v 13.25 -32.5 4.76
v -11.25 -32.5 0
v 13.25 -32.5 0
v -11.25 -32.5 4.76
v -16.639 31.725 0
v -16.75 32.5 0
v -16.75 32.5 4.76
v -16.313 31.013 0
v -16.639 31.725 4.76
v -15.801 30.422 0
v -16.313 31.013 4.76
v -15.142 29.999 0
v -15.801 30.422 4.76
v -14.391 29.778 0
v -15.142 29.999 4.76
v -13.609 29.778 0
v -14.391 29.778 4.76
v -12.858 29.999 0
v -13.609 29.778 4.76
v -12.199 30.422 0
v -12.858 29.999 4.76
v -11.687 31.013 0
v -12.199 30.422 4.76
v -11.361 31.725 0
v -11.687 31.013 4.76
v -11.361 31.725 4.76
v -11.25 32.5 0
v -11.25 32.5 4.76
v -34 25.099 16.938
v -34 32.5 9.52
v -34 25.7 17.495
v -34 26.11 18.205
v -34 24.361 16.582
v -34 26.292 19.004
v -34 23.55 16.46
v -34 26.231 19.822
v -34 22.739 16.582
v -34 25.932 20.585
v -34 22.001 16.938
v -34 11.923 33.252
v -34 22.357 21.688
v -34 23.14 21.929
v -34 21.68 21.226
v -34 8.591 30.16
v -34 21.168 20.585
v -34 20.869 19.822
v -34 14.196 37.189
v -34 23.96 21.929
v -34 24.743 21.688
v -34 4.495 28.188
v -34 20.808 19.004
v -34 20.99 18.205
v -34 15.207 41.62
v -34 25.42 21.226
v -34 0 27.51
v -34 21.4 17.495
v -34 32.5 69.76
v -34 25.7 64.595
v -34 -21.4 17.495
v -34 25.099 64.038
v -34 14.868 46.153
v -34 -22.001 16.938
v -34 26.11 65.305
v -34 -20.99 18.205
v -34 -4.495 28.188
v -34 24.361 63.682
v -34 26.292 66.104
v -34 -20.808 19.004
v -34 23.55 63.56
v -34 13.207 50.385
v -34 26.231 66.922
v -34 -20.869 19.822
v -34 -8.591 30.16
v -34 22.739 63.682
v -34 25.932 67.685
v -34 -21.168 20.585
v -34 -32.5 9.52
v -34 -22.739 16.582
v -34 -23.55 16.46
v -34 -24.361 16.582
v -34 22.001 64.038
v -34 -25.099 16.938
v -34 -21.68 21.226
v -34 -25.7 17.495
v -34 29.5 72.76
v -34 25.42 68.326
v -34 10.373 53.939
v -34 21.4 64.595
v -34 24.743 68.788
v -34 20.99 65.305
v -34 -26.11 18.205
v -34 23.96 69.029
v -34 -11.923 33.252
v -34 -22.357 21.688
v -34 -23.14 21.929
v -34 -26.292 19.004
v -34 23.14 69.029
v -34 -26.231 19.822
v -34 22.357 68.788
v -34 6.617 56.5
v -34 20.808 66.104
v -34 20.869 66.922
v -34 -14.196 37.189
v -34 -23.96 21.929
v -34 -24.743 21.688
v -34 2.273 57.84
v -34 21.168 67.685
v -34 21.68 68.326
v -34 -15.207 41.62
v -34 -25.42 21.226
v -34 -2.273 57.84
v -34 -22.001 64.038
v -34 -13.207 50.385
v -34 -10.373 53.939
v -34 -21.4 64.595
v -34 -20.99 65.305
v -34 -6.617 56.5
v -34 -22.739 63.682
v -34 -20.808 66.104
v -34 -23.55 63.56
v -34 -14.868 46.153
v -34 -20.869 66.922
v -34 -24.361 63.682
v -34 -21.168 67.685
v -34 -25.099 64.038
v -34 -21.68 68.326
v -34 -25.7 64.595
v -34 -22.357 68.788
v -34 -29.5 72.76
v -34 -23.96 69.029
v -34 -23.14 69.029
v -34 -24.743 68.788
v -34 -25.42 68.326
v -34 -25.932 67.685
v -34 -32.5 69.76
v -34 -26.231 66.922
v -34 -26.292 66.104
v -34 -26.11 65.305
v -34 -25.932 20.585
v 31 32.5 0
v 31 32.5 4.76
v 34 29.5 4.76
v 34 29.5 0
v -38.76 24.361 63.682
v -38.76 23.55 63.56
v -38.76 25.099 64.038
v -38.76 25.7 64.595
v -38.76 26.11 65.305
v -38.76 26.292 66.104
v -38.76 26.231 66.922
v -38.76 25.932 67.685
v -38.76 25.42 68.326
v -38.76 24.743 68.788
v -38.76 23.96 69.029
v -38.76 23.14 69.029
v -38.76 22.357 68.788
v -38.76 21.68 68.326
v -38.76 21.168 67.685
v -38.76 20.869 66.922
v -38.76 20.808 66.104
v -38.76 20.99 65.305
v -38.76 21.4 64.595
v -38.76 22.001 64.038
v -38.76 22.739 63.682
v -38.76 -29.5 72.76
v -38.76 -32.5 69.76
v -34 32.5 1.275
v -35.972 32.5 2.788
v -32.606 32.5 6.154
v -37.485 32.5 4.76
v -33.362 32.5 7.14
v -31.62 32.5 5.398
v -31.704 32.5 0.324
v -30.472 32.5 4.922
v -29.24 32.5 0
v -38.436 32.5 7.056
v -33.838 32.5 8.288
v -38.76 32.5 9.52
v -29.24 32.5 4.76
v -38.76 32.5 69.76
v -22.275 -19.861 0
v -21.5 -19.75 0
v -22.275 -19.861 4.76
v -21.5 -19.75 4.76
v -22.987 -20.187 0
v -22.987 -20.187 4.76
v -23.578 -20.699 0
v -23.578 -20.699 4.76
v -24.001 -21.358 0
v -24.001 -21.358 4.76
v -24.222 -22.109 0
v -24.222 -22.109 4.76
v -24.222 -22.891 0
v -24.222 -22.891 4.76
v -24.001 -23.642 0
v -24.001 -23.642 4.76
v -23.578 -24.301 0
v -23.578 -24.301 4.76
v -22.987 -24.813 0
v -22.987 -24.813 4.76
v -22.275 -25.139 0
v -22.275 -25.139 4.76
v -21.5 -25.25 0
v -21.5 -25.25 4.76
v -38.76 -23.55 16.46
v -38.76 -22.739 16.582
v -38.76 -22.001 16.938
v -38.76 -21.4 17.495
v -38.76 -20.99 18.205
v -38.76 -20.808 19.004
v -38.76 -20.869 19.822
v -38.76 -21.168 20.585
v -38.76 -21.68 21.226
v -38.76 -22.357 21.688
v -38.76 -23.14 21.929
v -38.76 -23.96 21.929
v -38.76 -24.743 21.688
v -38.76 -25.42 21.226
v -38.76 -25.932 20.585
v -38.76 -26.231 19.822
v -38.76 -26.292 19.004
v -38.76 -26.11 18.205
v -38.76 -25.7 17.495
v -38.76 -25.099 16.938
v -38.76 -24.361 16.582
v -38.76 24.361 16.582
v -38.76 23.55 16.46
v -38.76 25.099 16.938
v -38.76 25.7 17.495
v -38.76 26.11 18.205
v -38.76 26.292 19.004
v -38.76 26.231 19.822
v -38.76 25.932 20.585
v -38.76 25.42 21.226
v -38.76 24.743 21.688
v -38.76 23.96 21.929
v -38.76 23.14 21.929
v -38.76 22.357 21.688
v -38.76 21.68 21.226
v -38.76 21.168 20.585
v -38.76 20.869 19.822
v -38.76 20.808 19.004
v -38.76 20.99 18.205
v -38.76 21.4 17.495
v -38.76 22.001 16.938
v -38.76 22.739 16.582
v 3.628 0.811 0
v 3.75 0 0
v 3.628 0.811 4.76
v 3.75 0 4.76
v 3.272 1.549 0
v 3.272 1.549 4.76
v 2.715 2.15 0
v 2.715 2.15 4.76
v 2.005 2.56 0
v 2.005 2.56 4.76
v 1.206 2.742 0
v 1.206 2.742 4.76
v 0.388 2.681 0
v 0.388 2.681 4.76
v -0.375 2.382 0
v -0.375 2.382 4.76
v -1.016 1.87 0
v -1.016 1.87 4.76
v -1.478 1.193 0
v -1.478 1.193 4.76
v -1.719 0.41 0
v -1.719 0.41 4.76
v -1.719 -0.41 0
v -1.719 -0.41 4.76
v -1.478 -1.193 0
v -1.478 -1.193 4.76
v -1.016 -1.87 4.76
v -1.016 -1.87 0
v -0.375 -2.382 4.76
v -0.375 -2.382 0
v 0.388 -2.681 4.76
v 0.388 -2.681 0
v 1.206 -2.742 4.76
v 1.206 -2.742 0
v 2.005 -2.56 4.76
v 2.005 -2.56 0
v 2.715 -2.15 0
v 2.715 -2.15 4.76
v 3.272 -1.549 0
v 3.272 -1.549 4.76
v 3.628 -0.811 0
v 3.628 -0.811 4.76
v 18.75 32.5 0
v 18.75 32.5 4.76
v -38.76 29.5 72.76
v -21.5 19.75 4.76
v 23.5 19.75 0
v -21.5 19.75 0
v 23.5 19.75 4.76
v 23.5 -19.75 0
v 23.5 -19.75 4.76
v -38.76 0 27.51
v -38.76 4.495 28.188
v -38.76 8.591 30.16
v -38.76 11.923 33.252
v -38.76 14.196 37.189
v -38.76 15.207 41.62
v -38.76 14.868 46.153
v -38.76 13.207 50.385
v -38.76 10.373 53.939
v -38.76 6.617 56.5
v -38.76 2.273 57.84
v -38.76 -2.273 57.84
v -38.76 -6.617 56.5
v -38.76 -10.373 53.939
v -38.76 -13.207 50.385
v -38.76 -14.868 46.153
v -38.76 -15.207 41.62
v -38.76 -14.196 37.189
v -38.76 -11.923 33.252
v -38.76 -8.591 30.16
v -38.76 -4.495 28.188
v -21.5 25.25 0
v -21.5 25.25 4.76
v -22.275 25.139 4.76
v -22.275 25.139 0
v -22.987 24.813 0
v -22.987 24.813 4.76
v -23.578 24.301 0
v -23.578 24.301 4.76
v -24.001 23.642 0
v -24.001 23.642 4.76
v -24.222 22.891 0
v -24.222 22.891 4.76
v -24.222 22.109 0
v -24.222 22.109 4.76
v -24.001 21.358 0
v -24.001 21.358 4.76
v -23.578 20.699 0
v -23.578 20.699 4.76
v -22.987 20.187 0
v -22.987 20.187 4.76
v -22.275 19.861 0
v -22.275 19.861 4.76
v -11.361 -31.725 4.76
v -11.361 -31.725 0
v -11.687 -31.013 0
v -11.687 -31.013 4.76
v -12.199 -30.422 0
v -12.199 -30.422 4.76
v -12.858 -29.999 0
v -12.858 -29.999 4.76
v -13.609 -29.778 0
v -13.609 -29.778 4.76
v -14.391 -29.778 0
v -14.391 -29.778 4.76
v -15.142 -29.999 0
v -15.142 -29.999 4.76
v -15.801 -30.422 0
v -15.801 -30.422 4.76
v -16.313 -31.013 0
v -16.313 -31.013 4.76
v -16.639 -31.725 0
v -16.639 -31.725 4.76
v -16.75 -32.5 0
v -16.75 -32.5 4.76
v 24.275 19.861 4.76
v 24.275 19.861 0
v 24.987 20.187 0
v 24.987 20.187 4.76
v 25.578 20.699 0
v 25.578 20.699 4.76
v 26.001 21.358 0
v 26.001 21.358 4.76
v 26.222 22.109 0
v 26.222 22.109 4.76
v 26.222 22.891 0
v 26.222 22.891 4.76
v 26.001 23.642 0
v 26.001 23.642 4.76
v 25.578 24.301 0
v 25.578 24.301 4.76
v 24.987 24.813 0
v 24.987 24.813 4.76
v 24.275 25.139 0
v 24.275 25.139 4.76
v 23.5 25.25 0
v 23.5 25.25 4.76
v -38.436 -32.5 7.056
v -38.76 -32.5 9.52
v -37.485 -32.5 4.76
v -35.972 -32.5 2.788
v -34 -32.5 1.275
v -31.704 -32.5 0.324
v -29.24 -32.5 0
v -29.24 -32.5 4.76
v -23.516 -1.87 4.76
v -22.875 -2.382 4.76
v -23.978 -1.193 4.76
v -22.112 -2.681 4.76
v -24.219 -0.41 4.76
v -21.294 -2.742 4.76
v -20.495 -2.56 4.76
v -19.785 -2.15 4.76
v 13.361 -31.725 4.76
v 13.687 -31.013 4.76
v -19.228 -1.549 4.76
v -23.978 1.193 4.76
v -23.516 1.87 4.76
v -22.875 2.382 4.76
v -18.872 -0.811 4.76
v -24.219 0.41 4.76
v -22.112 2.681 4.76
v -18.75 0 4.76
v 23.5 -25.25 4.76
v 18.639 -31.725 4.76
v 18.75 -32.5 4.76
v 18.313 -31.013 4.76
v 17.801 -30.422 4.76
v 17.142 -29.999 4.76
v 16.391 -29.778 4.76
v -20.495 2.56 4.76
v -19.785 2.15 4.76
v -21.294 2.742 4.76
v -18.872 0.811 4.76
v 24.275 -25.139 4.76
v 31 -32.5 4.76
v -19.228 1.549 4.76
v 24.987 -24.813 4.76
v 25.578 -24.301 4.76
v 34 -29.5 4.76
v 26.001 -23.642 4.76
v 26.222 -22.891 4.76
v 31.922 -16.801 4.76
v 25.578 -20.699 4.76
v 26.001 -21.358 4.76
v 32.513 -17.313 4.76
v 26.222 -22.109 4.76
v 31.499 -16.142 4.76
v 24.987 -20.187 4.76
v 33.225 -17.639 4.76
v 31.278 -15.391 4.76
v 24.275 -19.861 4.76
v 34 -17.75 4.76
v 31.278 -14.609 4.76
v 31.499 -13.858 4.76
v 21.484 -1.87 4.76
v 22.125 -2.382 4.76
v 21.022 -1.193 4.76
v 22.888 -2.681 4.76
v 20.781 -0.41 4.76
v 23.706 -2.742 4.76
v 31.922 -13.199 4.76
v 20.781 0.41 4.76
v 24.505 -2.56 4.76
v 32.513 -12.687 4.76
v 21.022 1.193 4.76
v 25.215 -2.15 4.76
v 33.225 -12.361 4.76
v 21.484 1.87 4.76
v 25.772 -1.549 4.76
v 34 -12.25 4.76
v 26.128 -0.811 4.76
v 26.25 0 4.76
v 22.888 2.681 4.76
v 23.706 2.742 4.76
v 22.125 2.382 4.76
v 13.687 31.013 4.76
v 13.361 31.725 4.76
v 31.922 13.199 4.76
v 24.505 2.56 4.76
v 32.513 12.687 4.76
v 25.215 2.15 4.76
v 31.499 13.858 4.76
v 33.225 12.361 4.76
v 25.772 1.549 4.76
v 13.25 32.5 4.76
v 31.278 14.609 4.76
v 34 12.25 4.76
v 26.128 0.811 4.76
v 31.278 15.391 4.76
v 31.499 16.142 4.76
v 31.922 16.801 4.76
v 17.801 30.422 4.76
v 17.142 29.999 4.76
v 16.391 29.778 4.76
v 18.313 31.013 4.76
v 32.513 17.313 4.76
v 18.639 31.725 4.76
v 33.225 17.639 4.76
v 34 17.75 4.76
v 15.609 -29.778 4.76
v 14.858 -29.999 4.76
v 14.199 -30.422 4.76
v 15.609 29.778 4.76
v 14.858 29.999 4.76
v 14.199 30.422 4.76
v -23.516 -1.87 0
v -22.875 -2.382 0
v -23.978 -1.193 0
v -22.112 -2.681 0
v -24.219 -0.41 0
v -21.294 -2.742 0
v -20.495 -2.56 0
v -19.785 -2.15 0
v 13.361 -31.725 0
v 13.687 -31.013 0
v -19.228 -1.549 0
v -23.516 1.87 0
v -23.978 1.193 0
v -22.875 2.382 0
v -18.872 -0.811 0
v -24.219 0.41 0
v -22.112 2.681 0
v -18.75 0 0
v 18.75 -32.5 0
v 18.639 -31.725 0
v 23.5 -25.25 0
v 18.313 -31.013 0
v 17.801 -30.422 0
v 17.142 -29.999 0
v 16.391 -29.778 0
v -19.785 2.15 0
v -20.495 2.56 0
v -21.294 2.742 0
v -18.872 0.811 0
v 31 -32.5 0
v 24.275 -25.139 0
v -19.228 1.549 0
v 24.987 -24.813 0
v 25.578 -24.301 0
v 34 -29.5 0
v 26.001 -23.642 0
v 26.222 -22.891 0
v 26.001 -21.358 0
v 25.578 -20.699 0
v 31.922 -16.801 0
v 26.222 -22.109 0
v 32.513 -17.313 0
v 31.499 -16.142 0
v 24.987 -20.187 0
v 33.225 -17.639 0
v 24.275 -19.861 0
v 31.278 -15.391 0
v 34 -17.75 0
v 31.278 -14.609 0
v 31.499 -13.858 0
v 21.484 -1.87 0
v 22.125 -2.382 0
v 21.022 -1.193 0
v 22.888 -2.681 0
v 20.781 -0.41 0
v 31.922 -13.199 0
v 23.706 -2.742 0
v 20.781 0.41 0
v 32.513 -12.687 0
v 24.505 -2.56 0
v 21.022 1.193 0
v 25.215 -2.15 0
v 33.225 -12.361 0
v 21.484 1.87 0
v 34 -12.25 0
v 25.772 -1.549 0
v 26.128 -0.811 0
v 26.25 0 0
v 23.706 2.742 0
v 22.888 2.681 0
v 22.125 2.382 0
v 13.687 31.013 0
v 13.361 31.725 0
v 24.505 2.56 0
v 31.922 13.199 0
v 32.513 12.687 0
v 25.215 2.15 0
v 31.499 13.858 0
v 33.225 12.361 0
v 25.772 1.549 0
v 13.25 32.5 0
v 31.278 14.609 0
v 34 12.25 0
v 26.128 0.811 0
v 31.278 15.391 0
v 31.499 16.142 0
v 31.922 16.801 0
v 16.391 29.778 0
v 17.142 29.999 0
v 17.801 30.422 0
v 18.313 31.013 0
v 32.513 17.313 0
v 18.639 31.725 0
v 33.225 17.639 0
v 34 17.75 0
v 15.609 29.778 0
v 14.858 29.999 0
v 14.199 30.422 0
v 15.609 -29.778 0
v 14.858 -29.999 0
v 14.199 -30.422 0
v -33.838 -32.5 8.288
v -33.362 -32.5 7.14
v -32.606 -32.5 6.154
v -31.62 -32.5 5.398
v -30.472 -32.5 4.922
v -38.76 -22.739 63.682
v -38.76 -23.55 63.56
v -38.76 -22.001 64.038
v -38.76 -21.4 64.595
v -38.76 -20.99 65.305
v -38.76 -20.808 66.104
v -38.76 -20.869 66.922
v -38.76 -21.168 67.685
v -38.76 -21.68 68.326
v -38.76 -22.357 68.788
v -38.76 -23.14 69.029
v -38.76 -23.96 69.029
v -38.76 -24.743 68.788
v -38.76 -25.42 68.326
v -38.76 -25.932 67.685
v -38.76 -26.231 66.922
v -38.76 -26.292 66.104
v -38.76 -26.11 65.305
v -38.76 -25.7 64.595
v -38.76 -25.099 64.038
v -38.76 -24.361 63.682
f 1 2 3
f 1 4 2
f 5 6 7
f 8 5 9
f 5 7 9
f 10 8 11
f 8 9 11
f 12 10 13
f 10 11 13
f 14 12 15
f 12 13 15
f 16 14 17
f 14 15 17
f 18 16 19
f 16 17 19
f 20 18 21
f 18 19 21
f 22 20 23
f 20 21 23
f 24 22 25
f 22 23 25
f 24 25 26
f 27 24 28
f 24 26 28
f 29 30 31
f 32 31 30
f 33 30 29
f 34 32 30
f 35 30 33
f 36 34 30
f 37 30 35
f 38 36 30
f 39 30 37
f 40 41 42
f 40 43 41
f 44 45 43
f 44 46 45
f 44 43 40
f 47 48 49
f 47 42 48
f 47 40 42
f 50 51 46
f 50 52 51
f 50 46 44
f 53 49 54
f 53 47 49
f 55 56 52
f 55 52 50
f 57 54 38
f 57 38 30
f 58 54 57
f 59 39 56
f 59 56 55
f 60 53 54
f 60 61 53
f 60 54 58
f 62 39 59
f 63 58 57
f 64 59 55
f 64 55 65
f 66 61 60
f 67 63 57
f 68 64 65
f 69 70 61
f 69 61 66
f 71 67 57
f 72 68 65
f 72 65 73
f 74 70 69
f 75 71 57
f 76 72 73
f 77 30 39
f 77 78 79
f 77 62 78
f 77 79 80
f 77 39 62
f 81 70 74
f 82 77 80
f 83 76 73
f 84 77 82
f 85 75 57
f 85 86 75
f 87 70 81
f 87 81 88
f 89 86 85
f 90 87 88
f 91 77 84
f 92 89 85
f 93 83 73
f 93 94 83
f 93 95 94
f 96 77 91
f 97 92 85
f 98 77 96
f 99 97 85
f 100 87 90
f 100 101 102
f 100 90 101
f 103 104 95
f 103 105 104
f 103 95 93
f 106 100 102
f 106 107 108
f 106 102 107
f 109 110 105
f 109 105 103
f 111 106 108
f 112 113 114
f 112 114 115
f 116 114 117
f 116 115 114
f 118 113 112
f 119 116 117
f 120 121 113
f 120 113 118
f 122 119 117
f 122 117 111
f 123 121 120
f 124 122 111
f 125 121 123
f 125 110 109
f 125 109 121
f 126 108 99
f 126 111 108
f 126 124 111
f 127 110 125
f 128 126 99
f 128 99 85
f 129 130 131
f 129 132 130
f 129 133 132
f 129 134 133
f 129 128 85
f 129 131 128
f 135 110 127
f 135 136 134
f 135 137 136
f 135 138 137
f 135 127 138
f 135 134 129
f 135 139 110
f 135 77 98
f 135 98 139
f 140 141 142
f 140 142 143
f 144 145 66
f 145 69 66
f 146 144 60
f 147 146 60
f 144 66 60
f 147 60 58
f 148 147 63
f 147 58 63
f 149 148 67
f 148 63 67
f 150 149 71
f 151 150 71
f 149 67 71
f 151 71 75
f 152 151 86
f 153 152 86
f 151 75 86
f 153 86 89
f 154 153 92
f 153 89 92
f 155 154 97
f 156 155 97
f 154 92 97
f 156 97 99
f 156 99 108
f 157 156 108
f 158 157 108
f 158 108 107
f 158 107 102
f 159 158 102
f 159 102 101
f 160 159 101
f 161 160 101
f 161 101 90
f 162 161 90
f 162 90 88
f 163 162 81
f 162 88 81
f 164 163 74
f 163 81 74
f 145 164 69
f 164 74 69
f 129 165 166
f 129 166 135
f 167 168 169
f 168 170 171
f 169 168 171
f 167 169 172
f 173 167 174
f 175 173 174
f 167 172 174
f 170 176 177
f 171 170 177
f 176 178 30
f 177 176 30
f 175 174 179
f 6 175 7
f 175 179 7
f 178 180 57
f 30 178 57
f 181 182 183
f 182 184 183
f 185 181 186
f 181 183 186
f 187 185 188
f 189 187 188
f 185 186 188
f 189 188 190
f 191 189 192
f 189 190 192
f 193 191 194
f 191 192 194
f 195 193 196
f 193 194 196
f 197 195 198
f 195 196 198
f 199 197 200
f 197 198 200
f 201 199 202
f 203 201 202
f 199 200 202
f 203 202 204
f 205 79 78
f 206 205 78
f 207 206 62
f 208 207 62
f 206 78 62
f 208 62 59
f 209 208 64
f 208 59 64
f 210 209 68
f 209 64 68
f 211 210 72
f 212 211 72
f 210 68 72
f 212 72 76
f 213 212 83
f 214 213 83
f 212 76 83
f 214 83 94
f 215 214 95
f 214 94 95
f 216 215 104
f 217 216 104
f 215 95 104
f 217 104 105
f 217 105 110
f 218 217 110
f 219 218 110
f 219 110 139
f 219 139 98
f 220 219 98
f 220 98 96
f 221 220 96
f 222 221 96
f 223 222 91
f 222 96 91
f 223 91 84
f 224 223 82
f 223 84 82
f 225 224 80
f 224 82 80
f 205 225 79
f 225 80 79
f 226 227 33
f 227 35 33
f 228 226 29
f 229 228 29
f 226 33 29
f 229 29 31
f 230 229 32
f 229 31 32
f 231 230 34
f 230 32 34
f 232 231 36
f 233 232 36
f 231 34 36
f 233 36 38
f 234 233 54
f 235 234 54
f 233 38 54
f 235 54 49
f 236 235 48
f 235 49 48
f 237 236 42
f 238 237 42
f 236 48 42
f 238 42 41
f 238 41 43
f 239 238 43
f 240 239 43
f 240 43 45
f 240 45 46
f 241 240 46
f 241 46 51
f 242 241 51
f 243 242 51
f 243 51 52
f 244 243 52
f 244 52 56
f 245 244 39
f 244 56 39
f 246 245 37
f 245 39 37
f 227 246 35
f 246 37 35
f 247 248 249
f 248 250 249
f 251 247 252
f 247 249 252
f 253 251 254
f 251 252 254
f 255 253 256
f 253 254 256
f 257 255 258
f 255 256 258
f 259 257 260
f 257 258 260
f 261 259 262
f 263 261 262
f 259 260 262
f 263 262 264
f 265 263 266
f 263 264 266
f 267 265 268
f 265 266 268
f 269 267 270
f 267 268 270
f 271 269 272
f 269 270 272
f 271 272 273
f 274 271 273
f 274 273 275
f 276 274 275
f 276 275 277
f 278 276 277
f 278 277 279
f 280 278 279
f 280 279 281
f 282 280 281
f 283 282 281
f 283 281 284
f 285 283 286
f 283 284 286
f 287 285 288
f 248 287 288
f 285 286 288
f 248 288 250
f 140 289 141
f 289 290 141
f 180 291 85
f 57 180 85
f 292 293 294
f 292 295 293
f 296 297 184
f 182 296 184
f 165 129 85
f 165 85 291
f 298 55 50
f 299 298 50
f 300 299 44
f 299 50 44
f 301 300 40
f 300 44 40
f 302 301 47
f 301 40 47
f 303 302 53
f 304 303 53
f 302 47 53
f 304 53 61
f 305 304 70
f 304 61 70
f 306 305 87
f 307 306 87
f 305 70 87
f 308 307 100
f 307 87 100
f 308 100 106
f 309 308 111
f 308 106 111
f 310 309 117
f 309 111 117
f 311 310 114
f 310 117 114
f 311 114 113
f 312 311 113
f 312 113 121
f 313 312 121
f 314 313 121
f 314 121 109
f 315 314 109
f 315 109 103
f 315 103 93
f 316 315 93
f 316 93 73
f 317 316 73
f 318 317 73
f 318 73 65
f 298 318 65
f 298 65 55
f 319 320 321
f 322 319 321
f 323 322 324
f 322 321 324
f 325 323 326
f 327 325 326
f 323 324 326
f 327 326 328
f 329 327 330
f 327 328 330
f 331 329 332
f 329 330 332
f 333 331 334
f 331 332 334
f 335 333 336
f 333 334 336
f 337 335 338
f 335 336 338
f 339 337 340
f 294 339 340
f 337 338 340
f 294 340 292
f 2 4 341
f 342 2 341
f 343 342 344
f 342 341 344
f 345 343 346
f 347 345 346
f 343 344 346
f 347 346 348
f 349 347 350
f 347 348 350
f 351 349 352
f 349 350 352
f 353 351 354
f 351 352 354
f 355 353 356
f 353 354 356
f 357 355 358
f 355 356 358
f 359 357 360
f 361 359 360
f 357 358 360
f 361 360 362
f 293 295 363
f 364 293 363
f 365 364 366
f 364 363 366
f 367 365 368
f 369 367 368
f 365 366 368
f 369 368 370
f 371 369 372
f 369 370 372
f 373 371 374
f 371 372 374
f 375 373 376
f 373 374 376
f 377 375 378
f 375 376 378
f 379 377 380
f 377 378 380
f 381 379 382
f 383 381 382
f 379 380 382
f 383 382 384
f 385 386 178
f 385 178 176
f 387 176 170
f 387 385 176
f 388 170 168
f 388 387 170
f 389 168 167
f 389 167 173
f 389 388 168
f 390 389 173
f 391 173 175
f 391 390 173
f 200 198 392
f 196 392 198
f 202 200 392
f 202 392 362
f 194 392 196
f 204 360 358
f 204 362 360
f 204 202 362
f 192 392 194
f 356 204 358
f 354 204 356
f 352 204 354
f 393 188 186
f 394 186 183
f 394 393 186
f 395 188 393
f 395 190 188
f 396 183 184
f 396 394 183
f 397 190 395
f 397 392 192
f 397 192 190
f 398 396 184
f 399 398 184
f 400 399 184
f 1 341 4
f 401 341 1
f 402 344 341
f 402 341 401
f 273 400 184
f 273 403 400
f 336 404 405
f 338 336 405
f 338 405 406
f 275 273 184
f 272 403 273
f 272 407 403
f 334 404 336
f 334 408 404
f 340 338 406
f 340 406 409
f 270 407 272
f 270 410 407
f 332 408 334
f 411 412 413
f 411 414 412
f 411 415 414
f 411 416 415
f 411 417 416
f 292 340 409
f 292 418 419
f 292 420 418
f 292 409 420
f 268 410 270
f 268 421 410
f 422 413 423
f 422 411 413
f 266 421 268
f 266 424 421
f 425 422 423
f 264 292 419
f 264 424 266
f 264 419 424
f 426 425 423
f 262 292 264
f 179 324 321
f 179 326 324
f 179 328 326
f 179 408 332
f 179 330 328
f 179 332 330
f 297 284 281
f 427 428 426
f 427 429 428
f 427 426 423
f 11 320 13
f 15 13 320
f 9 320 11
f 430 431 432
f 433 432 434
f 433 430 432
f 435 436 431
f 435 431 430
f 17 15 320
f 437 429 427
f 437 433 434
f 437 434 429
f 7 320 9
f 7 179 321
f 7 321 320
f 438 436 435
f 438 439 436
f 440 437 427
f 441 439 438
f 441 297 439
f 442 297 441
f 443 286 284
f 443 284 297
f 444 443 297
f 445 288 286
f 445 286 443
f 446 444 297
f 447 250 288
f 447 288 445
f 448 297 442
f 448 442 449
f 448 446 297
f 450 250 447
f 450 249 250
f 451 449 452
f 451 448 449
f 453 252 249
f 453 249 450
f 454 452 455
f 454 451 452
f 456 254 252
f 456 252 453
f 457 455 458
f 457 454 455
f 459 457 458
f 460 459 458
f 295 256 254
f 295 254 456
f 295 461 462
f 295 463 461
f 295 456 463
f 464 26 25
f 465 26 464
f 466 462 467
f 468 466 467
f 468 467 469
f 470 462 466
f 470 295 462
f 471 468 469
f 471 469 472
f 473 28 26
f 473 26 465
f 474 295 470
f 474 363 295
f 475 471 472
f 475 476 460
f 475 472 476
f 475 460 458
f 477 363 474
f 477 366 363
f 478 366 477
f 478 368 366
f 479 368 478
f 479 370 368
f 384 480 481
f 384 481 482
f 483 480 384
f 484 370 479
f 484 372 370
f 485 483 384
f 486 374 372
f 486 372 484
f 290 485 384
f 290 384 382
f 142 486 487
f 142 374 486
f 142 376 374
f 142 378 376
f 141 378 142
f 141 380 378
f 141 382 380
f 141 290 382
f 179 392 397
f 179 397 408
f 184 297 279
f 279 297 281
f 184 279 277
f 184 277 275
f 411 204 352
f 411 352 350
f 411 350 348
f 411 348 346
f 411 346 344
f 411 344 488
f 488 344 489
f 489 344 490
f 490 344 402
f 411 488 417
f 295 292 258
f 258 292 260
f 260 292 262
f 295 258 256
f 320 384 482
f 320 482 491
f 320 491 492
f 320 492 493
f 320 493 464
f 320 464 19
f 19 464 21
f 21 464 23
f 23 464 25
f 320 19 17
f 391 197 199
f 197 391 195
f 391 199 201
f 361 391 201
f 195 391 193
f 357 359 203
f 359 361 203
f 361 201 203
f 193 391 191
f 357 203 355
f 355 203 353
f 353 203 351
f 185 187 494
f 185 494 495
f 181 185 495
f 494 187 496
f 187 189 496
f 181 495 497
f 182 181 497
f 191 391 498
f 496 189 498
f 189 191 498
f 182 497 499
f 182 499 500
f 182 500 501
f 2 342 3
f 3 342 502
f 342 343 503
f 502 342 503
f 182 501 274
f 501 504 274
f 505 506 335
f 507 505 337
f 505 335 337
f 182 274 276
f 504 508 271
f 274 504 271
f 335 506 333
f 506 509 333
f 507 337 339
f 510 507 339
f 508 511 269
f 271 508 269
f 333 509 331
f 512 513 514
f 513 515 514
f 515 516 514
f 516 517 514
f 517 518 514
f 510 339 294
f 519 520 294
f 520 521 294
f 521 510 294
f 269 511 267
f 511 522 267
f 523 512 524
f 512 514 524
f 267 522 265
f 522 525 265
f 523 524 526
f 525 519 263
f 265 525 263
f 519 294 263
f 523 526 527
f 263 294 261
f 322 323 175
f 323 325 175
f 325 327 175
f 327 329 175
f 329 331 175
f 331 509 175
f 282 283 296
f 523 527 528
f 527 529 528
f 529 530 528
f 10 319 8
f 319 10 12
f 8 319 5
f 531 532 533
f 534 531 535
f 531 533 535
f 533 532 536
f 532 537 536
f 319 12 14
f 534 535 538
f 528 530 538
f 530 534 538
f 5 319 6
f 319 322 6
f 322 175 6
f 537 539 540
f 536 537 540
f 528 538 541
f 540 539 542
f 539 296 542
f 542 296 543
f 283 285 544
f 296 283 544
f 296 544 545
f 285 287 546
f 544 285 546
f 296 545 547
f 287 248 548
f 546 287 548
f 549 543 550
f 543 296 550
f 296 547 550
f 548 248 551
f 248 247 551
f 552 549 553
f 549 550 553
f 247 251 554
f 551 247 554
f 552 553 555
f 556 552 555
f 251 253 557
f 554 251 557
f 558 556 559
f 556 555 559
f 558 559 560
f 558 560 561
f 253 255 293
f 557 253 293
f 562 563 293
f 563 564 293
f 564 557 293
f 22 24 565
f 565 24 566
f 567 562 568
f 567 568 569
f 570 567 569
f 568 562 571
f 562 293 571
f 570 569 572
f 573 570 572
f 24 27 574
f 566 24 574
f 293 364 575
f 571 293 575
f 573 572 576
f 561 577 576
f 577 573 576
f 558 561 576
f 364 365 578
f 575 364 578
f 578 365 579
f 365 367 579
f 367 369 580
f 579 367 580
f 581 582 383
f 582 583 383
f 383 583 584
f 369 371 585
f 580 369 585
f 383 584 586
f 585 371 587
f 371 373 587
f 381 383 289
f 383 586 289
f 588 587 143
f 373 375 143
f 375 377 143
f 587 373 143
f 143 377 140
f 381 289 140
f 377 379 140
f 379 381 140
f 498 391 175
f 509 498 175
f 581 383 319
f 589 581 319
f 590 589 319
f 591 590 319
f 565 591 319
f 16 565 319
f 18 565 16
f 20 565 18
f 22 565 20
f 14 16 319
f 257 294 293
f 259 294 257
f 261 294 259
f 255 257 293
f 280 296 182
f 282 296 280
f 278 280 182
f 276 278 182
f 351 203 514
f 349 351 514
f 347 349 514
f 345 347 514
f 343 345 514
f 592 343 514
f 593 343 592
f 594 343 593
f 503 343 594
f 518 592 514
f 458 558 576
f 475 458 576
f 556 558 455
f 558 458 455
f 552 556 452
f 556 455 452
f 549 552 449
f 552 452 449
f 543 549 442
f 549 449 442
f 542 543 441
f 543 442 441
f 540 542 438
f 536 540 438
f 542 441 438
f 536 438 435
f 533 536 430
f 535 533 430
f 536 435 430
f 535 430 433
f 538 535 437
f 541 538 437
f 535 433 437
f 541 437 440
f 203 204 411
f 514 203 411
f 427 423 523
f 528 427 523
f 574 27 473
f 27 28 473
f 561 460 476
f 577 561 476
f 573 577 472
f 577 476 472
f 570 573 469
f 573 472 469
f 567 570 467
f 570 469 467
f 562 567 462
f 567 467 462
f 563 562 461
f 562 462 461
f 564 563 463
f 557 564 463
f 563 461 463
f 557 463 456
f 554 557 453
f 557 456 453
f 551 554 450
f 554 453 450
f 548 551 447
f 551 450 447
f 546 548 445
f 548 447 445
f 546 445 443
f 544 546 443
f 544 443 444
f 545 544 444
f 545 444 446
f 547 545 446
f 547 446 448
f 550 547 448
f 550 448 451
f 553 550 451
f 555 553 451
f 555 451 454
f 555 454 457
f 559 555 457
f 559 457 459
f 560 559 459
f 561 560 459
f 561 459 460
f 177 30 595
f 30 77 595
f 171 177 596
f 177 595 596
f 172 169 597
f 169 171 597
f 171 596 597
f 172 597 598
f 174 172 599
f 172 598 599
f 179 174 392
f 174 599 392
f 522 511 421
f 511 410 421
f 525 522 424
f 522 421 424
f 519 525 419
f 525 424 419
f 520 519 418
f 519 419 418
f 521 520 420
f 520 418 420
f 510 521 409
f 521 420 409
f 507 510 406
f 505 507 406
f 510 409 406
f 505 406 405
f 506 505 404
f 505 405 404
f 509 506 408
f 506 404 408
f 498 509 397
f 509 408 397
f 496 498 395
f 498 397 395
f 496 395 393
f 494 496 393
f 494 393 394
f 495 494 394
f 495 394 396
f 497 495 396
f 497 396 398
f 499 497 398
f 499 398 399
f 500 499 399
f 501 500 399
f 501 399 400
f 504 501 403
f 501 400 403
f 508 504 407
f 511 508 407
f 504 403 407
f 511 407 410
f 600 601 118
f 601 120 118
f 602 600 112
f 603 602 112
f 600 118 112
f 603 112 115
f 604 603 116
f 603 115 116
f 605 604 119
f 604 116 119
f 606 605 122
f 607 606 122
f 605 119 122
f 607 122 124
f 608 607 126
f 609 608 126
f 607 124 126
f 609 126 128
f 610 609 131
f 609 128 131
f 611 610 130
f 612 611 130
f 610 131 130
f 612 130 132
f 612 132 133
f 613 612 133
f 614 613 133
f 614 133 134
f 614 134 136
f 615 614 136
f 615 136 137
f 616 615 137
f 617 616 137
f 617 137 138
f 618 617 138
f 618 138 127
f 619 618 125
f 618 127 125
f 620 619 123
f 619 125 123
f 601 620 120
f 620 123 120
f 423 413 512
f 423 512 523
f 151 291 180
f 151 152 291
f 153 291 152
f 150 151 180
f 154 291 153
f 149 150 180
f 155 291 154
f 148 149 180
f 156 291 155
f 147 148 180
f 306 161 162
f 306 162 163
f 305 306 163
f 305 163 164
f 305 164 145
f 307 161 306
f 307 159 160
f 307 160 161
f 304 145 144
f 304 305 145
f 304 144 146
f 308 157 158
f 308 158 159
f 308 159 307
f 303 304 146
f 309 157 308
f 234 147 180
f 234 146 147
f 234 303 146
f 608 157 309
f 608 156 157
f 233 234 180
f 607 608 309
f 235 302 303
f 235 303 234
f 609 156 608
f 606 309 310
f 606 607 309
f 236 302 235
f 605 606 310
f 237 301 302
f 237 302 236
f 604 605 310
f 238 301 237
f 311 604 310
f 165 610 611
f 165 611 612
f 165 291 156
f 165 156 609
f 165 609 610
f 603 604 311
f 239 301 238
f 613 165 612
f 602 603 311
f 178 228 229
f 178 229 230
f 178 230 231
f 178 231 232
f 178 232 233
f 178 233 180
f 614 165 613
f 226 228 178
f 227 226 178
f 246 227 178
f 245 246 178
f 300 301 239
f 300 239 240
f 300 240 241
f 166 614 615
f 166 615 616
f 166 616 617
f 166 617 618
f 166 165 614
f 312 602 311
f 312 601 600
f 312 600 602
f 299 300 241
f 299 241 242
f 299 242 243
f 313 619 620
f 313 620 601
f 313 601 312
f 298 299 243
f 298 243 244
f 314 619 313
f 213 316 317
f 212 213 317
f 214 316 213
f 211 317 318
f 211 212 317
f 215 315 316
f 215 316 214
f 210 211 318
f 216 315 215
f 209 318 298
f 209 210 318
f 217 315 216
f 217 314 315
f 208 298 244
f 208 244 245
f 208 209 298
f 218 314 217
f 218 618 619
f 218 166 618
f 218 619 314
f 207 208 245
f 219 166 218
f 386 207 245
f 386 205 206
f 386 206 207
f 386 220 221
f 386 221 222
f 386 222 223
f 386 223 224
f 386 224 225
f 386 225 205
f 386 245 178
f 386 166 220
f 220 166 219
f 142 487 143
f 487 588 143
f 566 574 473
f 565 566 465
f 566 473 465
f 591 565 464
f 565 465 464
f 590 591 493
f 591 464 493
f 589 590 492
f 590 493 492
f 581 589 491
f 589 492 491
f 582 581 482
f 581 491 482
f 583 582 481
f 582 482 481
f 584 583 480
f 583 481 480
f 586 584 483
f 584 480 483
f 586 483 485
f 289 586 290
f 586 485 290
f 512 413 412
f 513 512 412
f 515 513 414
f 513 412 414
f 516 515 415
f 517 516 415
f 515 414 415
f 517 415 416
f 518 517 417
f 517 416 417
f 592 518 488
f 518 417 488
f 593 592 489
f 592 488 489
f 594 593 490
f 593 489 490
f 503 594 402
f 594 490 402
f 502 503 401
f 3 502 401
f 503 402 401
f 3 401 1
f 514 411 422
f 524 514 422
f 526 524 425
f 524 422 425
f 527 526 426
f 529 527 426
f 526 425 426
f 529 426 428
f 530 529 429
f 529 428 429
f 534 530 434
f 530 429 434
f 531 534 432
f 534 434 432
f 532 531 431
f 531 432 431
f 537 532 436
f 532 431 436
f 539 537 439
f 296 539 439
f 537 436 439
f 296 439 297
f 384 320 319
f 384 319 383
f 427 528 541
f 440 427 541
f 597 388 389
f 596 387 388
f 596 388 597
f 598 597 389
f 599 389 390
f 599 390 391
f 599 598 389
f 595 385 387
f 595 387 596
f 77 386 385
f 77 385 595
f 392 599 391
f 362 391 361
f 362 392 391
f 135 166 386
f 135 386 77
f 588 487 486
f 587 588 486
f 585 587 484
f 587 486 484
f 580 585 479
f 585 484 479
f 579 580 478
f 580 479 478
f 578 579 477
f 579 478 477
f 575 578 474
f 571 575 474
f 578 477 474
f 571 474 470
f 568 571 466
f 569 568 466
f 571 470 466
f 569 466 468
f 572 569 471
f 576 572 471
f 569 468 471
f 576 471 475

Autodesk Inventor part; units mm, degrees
ref_plane "YZ Plane" through (0, 0, 0) normal (1, 0, 0) x (0, 1, 0)
ref_plane "XZ Plane" through (0, 0, 0) normal (0, 1, 0) x (-1, 0, 0)
ref_plane "XY Plane" through (0, 0, 0) normal (0, 0, 1) x (1, 0, 0)
sketch "Sketch1" plane through (0, 0, 0) normal (0, 0, 1) x (1, 0, 0)
  line L0 (-34, -32.5) -> (34, -32.5)
  line L1 (34, -32.5) -> (34, 32.5)
  line L2 (34, 32.5) -> (-34, 32.5)
  line L3 (-34, 32.5) -> (-34, -32.5)
  line L4 (-34, -32.5) -> (34, 32.5) construction
  line L5 (34, -32.5) -> (-34, 32.5) construction
  point P0 (0, 0)
  dimension "d0" = 68
  dimension "d1" = 65
extrude "Plate1" add sketch "Sketch1" along normal blind 4.76
sketch "Sketch2" plane through (-34, -32.5, 4.76) normal (-1, 0, 0) x (0, -1, 0)
  line L0 (-65, 0) -> (0, 0)
  line L1 (0, 0) -> (0, 68)
  line L2 (0, 68) -> (-65, 68)
  line L3 (-65, 68) -> (-65, 0)
edge flange "Flange1" height 72.76 angle 90 thickness 4.76 bend radius 4.76 thickness toward (-1, 0, 0) relief tear relief width 4.76 relief depth 2.38 edges at (-34, 0, 4.76) wall of the first edge with corners at (-34, 32.5, 4.76) (-34, -32.5, 4.76) (-34, -32.5, 72.76) (-34, 32.5, 72.76)
bend "Bend1"
corner "Corner1"
sketch "Sketch3" plane through (0, 0, 4.76) normal (0, 0, 1) x (1, 0, 0)
  line L0 (-29.24, 32.5) -> (-29.24, -32.5) construction
  line L1 (34, -32.5) -> (-29.24, -32.5) construction
  line L2 (34, 32.5) -> (34, -32.5) construction
  line L3 (-29.24, 32.5) -> (34, 32.5) construction
  line L4 (-29.24, 32.5) -> (34, 32.5) projected
  circle A0 centre (-14, 32.5) radius 2.75
  circle A1 centre (16, 32.5) radius 2.75
  line L5 (34, 32.5) -> (34, -32.5) construction
  line L6 (34, 0) -> (-29.24, 0) construction
  line L7 (-29.24, 32.5) -> (-29.24, -32.5) construction
  arc A2 (-21.5, 25.25) -> (-21.5, 19.75) centre (-21.5, 22.5) ccw
  arc A3 (20.75, 22.5) -> (23.5, 19.75) centre (23.5, 22.5) ccw construction
  line L8 (-21.5, 22.5) -> (23.5, 22.5) construction
  line L9 (-21.5, 25.25) -> (23.5, 25.25)
  line L10 (23.5, 19.75) -> (-21.5, 19.75)
  arc A4 (-18.75, 22.5) -> (-21.5, 25.25) centre (-21.5, 22.5) ccw construction
  arc A5 (-21.5, 19.75) -> (-18.75, 22.5) centre (-21.5, 22.5) ccw construction
  arc A6 (23.5, 25.25) -> (20.75, 22.5) centre (23.5, 22.5) ccw construction
  arc A7 (23.5, 19.75) -> (23.5, 25.25) centre (23.5, 22.5) ccw
  circle A8 centre (34, 15) radius 2.75
  circle A9 centre (-14, -32.5) radius 2.75
  circle A10 centre (16, -32.5) radius 2.75
  arc A11 (-21.5, -19.75) -> (-21.5, -25.25) centre (-21.5, -22.5) ccw
  line L11 (-21.5, -25.25) -> (23.5, -25.25)
  line L12 (23.5, -19.75) -> (-21.5, -19.75)
  arc A12 (23.5, -25.25) -> (23.5, -19.75) centre (23.5, -22.5) ccw
  circle A13 centre (34, -15) radius 2.75
  line L13 (-21.5, 22.5) -> (-21.5, -22.5) construction
  line L14 (23.5, 22.5) -> (23.5, -22.5) construction
  line L15 (23.5, -22.5) -> (-21.5, -22.5) construction
  line L16 (1, -22.5) -> (1, 22.5) construction
  circle A14 centre (-21.5, 0) radius 2.75
  circle A15 centre (1, 0) radius 2.75
  circle A16 centre (23.5, 0) radius 2.75
  point P0 (0, 0)
  dimension "d13" = 5.5
  dimension "d14" = 30
  dimension "d15" = 18
  dimension "d16" = 5.5
  dimension "d17" = 45
  dimension "d18" = 10.5
  dimension "d19" = 45
  dimension "d20" = 30
extrude "Cut1" cut sketch "Sketch3" against normal blind 4.76
sketch "Sketch4" plane through (-34, -32.5, 72.76) normal (1, 0, 0) x (0, 0, -1)
  line L0 (63.24, 0) -> (63.24, 65) construction
  line L1 (0, 65) -> (63.24, 65) construction
  line L2 (0, 65) -> (0, 0) construction
  line L3 (0, 0) -> (63.24, 0) construction
  line L4 (0, 65) -> (0, 0) construction
  line L5 (0, 32.5) -> (63.24, 32.5) construction
  circle A0 centre (30, 32.5) radius 15.25
  line L6 (53.55, 8.95) -> (6.45, 8.95) construction
  line L7 (6.45, 8.95) -> (6.45, 56.05) construction
  line L8 (6.45, 56.05) -> (53.55, 56.05) construction
  line L9 (53.55, 56.05) -> (53.55, 8.95) construction
  line L10 (53.55, 8.95) -> (6.45, 56.05) construction
  line L11 (6.45, 8.95) -> (53.55, 56.05) construction
  circle A1 centre (6.45, 8.95) radius 2.75
  circle A2 centre (6.45, 56.05) radius 2.75
  circle A3 centre (53.55, 56.05) radius 2.75
  circle A4 centre (53.55, 8.95) radius 2.75
  point P0 (72.76, 32.5)
  dimension "d23" = 30
  dimension "d24" = 30.5
  dimension "d25" = 47.1
  dimension "d26" = 5.5
extrude "Cut2" cut sketch "Sketch4" against normal blind 4.76
chamfer "Corner Chamfer1" distance 3 angle 45 4 edges at (-36.38, 32.5, 72.76) (-36.38, -32.5, 72.76) (34, -32.5, 2.38) (34, 32.5, 2.38)
equation "\"d21\" = Thickness"
equation "\"d27\" = Thickness"
equation "\"d3\" = BendReliefWidth"
equation "\"d4\" = BendReliefDepth"
equation "\"d5\" = MinimumRemnant"
equation "\"d6\" = BendRadius"
equation "\"d9\" = BendRadius"
equation "\"d10\" = CornerReliefSize"
equation "\"d11\" = GapSize"
equation "\"d12\" = JacobiRadiusSize"
equation "\"BendRadius\" = Thickness"
equation "\"BendReliefWidth\" = Thickness"
equation "\"BendReliefDepth\" = 0.5 * Thickness"
equation "\"CornerReliefSize\" = 4 * Thickness"
equation "\"MinimumRemnant\" = 2 * Thickness"
equation "\"TransitionRadius\" = BendRadius"
equation "\"JacobiRadiusSize\" = BendRadius"
equation "\"GapSize\" = Thickness"
equation "\"d2\" = BendRadius"
equation "\"Thickness\" = 4.76"
properties part number "nema_support_techmakers" material "Steel, Alloy"
